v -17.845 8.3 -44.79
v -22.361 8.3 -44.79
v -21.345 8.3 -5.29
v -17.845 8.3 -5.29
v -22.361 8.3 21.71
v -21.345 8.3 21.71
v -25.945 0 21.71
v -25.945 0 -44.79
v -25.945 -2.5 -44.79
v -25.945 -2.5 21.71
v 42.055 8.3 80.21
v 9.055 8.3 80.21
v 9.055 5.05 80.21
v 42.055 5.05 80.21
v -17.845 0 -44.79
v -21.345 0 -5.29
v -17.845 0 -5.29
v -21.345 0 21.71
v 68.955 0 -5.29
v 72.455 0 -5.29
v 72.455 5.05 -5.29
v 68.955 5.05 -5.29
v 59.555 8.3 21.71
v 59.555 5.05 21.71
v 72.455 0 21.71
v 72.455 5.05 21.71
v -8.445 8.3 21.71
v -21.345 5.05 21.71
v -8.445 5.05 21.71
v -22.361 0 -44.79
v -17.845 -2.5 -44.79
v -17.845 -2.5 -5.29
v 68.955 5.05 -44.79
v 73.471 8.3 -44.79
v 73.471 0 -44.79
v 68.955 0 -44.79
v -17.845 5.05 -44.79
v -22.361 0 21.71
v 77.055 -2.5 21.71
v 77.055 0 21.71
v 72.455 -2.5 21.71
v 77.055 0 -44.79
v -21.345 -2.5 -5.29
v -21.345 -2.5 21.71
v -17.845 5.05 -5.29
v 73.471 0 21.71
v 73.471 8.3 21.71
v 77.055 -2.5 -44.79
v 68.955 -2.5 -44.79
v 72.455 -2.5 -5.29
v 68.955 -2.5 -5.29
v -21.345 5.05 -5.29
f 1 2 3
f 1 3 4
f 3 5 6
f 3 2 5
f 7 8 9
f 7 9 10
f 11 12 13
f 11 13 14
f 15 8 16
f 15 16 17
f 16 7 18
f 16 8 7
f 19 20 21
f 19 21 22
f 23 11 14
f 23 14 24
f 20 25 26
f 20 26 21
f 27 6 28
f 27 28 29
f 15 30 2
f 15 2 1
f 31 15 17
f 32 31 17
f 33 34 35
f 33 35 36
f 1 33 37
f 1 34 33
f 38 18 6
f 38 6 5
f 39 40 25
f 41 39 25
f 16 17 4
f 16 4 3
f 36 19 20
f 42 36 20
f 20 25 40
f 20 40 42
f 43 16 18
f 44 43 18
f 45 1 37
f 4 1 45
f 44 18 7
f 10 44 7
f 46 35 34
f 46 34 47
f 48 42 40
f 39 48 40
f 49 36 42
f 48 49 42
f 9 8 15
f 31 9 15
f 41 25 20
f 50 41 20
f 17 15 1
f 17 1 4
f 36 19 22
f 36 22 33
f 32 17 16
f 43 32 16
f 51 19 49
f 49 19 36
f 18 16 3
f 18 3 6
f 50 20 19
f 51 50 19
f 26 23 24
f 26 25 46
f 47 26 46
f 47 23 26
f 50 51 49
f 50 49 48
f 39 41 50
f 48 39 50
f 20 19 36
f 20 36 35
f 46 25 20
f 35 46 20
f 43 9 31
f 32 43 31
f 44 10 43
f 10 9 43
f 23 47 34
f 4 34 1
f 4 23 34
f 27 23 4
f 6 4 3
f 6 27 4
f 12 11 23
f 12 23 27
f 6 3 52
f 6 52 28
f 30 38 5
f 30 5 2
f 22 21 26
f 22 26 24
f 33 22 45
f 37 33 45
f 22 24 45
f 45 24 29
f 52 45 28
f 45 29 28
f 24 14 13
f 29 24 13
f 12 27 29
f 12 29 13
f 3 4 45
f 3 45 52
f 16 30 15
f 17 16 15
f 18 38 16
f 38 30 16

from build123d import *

# Parameters (mm, degrees)
F0_W     = 3.5839973688
F0_H     = 66.5
F1_DEPTH = 2.5
F2_DEPTH = 8.3
F4_DEPTH = 3.25


with BuildPart() as f1:
    # F0 (on Front) → F1 (new body)
    with BuildSketch(Plane.XZ):
        with Locations((-24.1530238986, -11.5398805141)):
            Rectangle(F0_W, F0_H)
        Polygon((-21.345022583, 21.7101194859), (-22.3610252142, 21.7101194859), (-22.3610252142, -44.7898805141), (-17.845022583, -44.7898805141), (-17.845022583, -5.2898805141), (-21.345022583, -5.2898805141), align=None)
    extrude(amount=F1_DEPTH)


with BuildPart() as f1b:
    # F0 (on Front) → F1, piece 2 (new body)
    with BuildSketch(Plane.XZ):
        with Locations((75.2629787326, -11.5398805141)):
            Rectangle(F0_W, F0_H)
        Polygon((68.954977417, -5.2898805141), (68.954977417, -44.7898805141), (73.4709800482, -44.7898805141), (73.4709800482, 21.7101194859), (72.454977417, 21.7101194859), (72.454977417, -5.2898805141), align=None)
    extrude(amount=F1_DEPTH)


with BuildPart() as f2:
    # F0 (on Front) → F2 (new body)
    with BuildSketch(Plane.XZ):
        Polygon((-21.345022583, 21.7101194859), (-22.3610252142, 21.7101194859), (-22.3610252142, -44.7898805141), (-17.845022583, -44.7898805141), (-17.845022583, -5.2898805141), (-21.345022583, -5.2898805141), align=None)
    extrude(amount=-F2_DEPTH)


with BuildPart() as f2b:
    # F0 (on Front) → F2, piece 2 (new body)
    with BuildSketch(Plane.XZ):
        Polygon((68.954977417, -5.2898805141), (68.954977417, -44.7898805141), (73.4709800482, -44.7898805141), (73.4709800482, 21.7101194859), (72.454977417, 21.7101194859), (72.454977417, -5.2898805141), align=None)
    extrude(amount=-F2_DEPTH)

    # F3 (on face) → F4 (join)
    with BuildSketch(Plane(origin=(0, 8.3, 0), x_dir=(-1, 0, 0), z_dir=(0, 1, 0))):
        Polygon((21.345022583, -5.2898805141), (21.345022583, 21.7101194859), (8.4450252142, 21.7101194859), (-25.5549747858, 21.7101194859), (-25.5549747858, -44.7898805141), (17.845022583, -44.7898805141), (17.845022583, -5.2898805141), align=None)
        Polygon((-25.5549747858, 21.7101194859), (8.4450252142, 21.7101194859), (-9.0549747858, 80.2101194859), (-25.5549747858, 80.2101194859), align=None)
        Polygon((-59.5549747858, 21.7101194859), (-25.5549747858, 21.7101194859), (-25.5549747858, 80.2101194859), (-42.0549747858, 80.2101194859), align=None)
        Polygon((-73.4709747858, -44.7898805141), (-25.5549747858, -44.7898805141), (-25.5549747858, 21.7101194859), (-59.5549747858, 21.7101194859), (-73.4709747858, 21.7101194859), align=None)
    extrude(amount=-F4_DEPTH)


solid = Compound([f1.part, f1b.part, f2.part, f2b.part])
